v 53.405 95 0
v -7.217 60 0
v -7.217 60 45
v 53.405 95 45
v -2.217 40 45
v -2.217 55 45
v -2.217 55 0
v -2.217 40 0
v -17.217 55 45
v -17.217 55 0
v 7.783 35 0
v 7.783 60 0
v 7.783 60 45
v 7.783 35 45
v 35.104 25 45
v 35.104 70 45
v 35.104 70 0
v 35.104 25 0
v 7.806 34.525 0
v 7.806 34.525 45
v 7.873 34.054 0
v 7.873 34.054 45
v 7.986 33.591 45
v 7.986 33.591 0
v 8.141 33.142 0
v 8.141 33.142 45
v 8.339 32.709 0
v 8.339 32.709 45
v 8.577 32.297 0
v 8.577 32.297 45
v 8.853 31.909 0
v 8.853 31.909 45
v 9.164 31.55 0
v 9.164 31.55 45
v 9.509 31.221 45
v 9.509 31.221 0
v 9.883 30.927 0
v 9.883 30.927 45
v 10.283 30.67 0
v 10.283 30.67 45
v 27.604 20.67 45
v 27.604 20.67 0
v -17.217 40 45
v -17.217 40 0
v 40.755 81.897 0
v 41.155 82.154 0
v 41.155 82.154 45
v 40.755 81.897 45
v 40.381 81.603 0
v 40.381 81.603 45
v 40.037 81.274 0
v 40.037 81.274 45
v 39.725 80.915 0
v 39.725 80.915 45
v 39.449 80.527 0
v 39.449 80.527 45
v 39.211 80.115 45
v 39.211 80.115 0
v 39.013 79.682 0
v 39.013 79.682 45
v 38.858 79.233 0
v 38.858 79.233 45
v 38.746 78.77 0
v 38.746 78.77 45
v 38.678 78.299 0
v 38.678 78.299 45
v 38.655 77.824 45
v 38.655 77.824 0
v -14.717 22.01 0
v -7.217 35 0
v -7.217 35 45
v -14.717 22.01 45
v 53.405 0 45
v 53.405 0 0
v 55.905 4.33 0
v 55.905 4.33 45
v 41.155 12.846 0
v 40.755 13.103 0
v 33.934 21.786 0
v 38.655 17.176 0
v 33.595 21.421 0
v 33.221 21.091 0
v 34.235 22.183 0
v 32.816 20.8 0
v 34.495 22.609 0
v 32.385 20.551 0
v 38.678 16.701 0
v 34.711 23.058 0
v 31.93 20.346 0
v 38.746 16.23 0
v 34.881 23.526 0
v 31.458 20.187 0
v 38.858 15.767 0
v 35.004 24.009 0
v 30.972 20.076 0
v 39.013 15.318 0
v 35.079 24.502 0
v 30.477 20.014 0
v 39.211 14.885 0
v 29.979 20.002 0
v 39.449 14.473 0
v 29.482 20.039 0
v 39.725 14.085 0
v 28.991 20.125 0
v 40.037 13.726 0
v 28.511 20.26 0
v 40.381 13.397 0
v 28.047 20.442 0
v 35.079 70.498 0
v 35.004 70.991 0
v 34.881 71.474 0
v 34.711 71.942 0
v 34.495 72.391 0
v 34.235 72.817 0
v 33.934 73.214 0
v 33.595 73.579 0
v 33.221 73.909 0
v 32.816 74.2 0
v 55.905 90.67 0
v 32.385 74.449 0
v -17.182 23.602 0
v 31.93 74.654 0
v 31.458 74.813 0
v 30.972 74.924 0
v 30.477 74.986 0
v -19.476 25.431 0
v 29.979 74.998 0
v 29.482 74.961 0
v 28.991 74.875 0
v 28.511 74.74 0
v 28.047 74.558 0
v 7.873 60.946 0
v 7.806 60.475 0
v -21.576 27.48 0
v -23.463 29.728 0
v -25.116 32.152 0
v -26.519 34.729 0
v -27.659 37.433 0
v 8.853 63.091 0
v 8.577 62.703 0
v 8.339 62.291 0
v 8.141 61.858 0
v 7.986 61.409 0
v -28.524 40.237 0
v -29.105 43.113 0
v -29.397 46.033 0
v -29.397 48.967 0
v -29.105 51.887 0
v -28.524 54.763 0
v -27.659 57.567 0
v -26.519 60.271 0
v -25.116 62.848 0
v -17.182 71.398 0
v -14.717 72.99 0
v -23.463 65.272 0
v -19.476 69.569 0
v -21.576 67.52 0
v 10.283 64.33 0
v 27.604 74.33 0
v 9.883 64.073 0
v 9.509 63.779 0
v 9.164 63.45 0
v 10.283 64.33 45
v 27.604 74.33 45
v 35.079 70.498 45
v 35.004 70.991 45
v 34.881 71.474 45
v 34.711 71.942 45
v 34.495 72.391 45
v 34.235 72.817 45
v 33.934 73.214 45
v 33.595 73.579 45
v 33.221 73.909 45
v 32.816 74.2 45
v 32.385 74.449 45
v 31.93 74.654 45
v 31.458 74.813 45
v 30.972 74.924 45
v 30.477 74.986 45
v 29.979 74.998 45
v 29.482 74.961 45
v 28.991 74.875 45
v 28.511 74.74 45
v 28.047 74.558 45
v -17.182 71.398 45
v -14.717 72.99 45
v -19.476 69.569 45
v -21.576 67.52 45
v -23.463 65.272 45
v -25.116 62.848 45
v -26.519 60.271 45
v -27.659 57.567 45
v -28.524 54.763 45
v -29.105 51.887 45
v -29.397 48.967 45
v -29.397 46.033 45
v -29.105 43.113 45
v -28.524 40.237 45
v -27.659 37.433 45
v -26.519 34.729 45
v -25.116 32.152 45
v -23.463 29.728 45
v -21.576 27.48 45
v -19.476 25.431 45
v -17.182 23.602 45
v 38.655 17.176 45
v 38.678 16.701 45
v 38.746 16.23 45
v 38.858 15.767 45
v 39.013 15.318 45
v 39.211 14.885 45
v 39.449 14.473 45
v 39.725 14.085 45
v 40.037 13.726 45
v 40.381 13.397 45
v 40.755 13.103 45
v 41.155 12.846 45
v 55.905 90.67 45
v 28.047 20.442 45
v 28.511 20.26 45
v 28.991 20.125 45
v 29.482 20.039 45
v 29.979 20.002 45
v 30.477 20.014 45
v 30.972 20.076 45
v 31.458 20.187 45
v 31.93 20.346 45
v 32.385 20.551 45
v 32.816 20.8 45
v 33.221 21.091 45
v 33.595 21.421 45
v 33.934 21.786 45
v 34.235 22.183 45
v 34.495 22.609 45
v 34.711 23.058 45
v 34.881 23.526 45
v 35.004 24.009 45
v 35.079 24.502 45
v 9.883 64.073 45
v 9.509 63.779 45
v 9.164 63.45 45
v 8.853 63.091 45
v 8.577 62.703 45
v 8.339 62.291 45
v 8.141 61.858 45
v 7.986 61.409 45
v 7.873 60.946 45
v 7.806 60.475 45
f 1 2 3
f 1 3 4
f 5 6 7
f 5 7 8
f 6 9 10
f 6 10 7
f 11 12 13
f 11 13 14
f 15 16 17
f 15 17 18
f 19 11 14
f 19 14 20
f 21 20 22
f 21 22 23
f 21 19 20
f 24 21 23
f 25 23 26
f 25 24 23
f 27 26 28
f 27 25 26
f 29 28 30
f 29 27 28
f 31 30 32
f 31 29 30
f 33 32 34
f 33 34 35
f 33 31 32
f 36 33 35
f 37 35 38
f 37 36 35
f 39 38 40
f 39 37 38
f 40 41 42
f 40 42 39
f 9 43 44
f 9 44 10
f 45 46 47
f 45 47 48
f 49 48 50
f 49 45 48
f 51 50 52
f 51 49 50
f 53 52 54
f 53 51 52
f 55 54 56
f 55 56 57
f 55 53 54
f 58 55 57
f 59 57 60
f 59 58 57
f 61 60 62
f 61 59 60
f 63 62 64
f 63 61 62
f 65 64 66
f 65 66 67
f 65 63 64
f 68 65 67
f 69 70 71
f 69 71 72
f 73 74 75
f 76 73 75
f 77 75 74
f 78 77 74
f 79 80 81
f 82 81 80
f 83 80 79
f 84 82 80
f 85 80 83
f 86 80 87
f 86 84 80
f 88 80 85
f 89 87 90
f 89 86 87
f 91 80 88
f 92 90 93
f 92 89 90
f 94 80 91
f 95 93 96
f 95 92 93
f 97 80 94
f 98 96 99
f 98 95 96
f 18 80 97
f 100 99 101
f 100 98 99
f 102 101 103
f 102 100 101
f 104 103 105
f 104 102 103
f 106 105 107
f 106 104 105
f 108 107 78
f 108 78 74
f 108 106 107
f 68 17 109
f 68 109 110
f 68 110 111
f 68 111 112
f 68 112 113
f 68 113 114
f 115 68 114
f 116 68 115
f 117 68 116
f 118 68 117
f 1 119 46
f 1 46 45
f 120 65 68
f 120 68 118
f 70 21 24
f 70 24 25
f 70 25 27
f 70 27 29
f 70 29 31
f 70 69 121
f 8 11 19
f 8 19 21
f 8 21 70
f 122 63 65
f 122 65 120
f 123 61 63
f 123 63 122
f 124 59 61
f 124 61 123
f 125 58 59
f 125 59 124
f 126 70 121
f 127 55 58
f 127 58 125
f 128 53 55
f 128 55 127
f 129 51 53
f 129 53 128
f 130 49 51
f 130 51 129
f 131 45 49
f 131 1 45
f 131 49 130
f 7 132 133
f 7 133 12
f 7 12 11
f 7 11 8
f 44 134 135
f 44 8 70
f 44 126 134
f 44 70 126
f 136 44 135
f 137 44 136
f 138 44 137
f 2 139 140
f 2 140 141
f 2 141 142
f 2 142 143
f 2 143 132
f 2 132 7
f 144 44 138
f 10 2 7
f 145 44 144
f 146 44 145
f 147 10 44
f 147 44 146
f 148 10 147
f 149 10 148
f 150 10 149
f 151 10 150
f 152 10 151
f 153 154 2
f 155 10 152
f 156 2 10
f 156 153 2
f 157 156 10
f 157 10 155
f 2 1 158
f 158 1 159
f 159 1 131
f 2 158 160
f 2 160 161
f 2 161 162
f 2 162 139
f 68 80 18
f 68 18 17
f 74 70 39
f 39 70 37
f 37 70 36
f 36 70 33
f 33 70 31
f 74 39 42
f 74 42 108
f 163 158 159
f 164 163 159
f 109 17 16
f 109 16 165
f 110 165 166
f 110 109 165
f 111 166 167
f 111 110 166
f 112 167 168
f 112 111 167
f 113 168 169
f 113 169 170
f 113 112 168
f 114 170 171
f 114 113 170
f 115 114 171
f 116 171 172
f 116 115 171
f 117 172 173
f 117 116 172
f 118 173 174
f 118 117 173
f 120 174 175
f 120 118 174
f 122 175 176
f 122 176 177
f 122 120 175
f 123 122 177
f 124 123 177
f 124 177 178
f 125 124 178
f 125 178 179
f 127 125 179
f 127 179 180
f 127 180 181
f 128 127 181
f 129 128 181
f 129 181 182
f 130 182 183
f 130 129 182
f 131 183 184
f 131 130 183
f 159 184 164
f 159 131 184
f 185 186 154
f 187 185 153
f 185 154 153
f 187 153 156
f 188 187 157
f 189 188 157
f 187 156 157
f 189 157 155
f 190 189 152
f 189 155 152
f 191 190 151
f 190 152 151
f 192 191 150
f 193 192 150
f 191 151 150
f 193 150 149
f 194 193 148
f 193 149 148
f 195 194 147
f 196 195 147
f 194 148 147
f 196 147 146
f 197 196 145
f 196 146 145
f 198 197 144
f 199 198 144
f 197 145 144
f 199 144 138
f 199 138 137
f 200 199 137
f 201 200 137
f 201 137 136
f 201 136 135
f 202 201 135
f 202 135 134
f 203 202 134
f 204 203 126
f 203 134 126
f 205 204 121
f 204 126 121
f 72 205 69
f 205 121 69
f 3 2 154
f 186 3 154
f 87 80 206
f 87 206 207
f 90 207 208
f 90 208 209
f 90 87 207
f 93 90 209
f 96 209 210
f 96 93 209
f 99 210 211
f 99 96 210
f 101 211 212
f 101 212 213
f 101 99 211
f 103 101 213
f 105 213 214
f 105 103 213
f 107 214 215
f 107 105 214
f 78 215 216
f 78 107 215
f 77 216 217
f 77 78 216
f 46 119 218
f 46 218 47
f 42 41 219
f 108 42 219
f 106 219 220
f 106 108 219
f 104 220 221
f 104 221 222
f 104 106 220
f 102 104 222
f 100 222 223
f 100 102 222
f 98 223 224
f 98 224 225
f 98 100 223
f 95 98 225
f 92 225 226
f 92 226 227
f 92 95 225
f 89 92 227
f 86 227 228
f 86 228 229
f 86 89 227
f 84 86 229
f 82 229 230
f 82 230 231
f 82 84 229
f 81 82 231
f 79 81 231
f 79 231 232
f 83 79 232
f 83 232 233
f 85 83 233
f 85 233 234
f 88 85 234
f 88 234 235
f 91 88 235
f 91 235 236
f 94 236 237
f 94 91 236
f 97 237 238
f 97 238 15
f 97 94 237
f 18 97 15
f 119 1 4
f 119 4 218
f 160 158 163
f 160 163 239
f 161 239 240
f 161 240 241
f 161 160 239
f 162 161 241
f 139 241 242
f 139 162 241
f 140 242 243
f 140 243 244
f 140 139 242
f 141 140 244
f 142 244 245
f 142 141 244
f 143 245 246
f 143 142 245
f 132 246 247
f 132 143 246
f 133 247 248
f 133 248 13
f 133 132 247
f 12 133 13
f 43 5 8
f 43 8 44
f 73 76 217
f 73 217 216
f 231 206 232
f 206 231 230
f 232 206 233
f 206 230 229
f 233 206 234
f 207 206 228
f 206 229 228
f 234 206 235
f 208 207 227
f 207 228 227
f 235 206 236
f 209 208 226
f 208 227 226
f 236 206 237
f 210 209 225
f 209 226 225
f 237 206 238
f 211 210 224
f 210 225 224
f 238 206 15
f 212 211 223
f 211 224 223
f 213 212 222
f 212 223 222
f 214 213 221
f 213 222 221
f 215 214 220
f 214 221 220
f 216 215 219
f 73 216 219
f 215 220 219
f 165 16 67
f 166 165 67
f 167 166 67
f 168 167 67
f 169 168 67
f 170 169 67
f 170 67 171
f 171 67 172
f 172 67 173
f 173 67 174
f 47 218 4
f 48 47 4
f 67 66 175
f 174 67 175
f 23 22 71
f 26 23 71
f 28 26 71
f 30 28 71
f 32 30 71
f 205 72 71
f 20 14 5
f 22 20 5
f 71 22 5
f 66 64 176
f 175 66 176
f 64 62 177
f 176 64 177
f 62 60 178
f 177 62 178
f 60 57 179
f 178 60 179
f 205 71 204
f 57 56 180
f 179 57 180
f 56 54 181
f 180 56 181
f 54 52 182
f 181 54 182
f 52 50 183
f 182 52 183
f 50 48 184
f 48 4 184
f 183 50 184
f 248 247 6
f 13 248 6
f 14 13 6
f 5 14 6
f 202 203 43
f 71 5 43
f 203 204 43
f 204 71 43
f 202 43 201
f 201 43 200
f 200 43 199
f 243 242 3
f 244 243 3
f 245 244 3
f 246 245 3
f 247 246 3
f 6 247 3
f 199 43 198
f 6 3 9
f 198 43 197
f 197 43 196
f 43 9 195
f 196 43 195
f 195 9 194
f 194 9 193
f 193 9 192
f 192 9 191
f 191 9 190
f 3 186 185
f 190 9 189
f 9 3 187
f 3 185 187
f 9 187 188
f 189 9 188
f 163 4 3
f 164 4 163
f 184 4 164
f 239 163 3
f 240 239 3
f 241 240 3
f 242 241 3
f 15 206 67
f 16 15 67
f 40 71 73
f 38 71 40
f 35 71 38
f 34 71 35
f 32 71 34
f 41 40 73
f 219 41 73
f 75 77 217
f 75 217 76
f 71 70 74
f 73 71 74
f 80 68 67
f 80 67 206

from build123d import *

# Parameters (mm, degrees)
PAD_DEPTH = 45


with BuildPart() as part:
    # Sketch → Pad (new body)
    with BuildSketch(Plane.XY):
        with BuildLine():
            Line((-7.216883, 60.000014), (53.404888, 95.000027))
            Line((53.404888, 95.000027), (55.904888, 90.669901))
            Line((55.904888, 90.669901), (41.155181, 82.154148))
            ThreePointArc((41.155181, 82.154148), (39.32506, 80.324024), (38.655188, 77.824031))
            Line((38.655188, 77.824031), (38.655188, 17.175997))
            ThreePointArc((38.655188, 17.175997), (39.32506, 14.676003), (41.155181, 12.845879))
            Line((41.155181, 12.845879), (55.904888, 4.330126))
            Line((53.404888, 0), (55.904888, 4.330126))
            Line((-7.216883, 35.000014), (53.404888, 0))
            Line((-7.216883, 35.000014), (-14.716886, 22.009634))
            ThreePointArc((-14.716886, 72.990393), (-29.433759, 47.500014), (-14.716886, 22.009634))
            Line((-7.216883, 60.000014), (-14.716886, 72.990393))
        make_face()
        with BuildLine():
            Line((27.603603, 20.66989), (10.283122, 30.669879))
            ThreePointArc((7.783098, 35.000014), (8.45298, 32.500005), (10.283122, 30.669879))
            Line((7.783098, 60.000014), (7.783098, 35.000014))
            ThreePointArc((10.283122, 64.330148), (8.45298, 62.500022), (7.783098, 60.000014))
            Line((10.283122, 64.330148), (27.603603, 74.330137))
            ThreePointArc((35.1036, 70.000014), (32.603599, 74.330136), (27.603603, 74.330137))
            Line((35.1036, 70.000014), (35.1036, 25.000014))
            ThreePointArc((27.603603, 20.66989), (32.603599, 20.669891), (35.1036, 25.000014))
        make_face(mode=Mode.SUBTRACT)
        Polygon((-17.216902, 55.000014), (-2.216902, 55.000014), (-2.216902, 47.500014), (-2.216902, 40.000014), (-17.216902, 40.000014), align=None, mode=Mode.SUBTRACT)
    extrude(amount=PAD_DEPTH)


solid = part.part
